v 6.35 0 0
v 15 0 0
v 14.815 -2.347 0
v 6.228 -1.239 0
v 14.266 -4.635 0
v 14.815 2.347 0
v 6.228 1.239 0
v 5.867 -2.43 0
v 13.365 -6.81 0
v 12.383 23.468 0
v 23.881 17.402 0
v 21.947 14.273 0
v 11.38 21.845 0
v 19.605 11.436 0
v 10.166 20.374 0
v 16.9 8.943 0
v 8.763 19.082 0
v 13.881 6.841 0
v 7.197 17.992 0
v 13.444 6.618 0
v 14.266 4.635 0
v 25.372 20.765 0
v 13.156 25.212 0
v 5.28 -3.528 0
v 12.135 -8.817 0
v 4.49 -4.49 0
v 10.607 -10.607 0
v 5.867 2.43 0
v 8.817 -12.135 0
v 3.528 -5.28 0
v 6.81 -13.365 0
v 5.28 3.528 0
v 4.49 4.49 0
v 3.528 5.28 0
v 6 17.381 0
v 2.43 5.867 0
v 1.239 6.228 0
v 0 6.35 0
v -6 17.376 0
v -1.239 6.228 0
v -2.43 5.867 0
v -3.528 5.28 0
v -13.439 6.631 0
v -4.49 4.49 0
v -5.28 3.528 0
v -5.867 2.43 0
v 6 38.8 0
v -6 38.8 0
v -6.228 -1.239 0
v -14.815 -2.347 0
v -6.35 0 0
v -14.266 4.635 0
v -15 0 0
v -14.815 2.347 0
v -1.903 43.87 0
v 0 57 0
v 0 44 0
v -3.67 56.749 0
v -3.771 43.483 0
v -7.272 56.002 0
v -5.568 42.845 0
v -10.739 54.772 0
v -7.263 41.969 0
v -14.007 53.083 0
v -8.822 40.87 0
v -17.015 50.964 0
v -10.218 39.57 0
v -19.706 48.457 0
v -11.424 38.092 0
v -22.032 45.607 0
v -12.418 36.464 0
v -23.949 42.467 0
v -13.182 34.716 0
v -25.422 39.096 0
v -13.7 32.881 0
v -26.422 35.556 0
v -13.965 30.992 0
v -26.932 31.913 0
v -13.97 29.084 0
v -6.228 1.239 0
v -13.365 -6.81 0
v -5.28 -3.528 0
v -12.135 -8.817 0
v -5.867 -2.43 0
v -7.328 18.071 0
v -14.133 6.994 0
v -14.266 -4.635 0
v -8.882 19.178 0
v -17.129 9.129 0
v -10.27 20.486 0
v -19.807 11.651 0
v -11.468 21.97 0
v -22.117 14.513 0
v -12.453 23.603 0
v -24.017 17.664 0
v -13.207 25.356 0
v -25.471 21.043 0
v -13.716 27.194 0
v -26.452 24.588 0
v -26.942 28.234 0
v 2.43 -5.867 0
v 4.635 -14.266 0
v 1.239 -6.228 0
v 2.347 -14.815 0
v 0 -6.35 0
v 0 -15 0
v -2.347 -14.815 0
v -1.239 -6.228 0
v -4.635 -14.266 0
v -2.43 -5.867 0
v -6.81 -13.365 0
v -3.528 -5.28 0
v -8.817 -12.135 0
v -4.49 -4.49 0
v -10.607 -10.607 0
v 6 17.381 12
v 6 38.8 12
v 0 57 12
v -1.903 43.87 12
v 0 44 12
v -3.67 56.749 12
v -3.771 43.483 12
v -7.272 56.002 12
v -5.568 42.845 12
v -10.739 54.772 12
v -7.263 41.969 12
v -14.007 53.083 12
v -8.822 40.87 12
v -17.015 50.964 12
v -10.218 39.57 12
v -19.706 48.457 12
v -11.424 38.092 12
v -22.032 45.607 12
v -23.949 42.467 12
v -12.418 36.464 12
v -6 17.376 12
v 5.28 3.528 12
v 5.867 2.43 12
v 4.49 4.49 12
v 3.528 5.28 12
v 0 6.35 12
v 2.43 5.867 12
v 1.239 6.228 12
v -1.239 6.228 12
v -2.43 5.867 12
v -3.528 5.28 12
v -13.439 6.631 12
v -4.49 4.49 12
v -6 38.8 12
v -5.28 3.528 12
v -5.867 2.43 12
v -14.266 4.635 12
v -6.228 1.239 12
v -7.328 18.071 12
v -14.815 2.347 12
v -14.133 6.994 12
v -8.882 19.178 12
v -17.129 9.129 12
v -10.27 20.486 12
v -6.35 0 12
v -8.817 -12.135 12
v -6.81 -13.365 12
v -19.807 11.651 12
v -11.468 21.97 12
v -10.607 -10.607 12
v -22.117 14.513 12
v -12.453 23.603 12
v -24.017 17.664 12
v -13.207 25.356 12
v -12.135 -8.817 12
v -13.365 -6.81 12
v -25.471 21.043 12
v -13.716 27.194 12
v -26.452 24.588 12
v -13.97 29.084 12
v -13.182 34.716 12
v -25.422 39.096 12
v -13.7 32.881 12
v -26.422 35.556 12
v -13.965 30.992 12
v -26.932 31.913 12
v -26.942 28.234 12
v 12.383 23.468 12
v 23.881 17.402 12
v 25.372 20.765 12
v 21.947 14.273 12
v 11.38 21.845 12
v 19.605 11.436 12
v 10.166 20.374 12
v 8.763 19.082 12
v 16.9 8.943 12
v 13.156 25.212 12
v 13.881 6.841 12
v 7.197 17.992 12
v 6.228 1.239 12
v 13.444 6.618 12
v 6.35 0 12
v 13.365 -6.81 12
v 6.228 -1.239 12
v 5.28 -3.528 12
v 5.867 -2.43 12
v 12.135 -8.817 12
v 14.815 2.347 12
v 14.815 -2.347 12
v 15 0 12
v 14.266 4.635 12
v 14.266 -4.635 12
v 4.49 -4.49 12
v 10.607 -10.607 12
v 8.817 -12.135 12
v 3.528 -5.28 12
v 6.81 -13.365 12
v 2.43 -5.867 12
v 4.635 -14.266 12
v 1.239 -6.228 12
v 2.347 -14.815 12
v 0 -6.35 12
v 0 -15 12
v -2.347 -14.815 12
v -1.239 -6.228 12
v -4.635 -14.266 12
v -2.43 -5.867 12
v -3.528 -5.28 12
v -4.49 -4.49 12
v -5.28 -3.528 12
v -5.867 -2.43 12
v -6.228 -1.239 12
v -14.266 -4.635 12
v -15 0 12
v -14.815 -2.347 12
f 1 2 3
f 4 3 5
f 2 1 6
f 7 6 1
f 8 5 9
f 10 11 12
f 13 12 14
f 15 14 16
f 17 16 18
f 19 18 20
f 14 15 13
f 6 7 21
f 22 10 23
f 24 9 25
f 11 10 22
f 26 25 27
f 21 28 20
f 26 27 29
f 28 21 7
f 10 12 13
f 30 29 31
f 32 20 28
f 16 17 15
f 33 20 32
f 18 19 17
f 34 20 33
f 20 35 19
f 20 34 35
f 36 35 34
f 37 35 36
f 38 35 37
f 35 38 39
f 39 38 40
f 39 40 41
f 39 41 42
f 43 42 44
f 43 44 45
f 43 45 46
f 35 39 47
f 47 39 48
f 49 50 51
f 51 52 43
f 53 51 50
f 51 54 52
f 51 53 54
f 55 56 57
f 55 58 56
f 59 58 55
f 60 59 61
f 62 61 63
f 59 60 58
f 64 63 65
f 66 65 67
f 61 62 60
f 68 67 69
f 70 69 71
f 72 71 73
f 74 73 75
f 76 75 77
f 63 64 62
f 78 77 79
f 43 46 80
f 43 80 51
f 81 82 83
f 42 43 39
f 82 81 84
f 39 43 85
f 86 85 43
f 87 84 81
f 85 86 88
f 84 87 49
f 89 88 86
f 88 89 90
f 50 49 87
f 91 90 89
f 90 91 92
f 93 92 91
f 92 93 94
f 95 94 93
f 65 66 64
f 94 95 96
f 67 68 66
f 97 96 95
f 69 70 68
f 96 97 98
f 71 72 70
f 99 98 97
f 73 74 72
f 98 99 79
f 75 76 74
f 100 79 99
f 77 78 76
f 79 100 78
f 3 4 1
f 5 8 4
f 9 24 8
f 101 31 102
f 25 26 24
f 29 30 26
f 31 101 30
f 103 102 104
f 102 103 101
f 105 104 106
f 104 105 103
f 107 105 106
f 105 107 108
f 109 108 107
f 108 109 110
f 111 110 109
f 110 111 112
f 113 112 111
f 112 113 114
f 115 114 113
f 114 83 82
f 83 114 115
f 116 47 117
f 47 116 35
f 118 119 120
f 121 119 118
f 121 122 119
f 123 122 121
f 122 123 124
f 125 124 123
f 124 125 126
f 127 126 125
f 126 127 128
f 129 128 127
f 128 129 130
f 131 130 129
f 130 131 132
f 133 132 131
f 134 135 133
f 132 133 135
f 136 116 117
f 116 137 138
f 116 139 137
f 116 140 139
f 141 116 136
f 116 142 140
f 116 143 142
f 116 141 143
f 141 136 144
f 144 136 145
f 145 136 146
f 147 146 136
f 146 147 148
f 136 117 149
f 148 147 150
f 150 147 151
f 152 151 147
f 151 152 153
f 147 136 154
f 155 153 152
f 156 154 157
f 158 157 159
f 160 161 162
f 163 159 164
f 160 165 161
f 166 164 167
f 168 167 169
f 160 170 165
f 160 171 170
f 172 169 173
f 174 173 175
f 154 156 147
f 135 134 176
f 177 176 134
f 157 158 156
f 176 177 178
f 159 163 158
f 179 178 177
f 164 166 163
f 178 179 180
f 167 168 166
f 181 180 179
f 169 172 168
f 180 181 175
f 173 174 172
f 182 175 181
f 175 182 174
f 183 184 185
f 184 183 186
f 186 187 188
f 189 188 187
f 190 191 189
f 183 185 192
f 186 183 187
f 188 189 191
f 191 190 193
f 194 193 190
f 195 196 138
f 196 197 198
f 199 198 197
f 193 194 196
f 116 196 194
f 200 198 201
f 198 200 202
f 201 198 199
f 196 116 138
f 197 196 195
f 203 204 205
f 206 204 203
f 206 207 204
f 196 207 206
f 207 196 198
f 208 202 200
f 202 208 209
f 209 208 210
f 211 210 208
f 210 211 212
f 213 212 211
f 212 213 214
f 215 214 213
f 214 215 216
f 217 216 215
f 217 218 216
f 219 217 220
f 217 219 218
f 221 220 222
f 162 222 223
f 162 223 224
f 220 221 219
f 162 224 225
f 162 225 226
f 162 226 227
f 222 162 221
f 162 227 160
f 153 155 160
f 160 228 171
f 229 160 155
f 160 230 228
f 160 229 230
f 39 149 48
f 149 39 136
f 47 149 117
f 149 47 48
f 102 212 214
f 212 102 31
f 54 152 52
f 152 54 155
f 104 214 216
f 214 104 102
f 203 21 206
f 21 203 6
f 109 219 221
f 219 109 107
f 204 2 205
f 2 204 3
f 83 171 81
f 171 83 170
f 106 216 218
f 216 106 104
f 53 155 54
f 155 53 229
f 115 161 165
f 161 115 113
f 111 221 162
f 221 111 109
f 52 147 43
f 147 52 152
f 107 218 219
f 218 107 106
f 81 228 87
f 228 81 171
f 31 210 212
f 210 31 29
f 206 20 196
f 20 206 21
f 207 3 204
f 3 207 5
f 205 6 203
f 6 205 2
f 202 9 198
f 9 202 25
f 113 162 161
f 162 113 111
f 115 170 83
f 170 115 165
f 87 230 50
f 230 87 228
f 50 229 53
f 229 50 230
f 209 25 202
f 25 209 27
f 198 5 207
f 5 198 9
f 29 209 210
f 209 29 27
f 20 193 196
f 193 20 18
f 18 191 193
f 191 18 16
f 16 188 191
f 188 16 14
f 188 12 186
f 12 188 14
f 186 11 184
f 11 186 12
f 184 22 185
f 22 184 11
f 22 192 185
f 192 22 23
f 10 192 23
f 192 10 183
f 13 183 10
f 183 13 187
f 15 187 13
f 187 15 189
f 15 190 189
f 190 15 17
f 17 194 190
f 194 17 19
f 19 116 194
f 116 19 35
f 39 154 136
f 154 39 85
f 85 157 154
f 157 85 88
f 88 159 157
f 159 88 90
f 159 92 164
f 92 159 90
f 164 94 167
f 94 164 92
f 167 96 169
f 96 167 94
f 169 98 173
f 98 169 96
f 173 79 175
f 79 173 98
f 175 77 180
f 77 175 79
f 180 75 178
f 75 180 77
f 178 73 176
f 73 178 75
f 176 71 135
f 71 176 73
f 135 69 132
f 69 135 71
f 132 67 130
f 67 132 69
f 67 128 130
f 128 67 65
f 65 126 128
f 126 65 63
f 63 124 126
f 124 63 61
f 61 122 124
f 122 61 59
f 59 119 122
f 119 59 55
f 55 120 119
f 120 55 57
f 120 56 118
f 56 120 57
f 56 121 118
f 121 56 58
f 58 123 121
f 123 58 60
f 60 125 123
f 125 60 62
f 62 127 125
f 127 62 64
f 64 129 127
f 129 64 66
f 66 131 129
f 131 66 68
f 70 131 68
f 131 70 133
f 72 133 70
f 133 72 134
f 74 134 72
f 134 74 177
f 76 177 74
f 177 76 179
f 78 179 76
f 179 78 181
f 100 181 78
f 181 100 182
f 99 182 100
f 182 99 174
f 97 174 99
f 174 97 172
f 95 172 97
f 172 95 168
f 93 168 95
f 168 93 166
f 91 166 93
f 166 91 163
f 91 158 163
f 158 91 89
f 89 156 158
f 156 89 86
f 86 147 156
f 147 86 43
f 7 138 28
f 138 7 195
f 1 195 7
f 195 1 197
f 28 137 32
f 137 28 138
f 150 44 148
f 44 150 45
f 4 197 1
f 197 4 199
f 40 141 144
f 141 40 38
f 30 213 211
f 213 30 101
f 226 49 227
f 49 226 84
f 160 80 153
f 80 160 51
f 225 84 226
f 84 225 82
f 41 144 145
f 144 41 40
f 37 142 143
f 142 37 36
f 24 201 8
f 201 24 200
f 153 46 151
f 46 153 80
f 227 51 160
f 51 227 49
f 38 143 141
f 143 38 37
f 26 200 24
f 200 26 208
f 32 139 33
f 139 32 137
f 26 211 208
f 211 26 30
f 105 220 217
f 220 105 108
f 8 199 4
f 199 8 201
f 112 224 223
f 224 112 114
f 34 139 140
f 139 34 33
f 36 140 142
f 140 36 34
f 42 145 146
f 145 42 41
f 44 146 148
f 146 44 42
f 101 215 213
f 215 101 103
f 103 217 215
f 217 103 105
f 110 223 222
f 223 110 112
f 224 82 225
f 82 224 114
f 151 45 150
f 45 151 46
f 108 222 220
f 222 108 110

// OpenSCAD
$fn = 32;

// ----------------------------------------------------------------------
// Hook: 60 mm shank into a 14 mm curl, 12 mm thick
// ----------------------------------------------------------------------

// --- parameters (mm) ---
shank_len = 60;           // shank length from the boss centre
shank_w = 12;             // shank width
boss_d = 30;              // boss diameter
bore_d = 12.7;            // boss bore
curl_in = 14;             // curl inner radius
curl_out = 27;            // curl outer radius
curl_sweep = 250;         // curl sweep angle
hook_t = 12;              // hook thickness

shank_profile = [[-6, 38.8], [6, 38.8], [6, 13], [-6, 13]];
boss_profile = [[15, 0], [14.815, 2.347], [14.266, 4.635], [13.365, 6.81], [12.135, 8.817], [10.607, 10.607], [8.817, 12.135], [6.81, 13.365], [4.635, 14.266], [2.347, 14.815], [0, 15], [-2.347, 14.815], [-4.635, 14.266], [-6.81, 13.365], [-8.817, 12.135], [-10.607, 10.607], [-12.135, 8.817], [-13.365, 6.81], [-14.266, 4.635], [-14.815, 2.347], [-15, 0], [-14.815, -2.347], [-14.266, -4.635], [-13.365, -6.81], [-12.135, -8.817], [-10.607, -10.607], [-8.817, -12.135], [-6.81, -13.365], [-4.635, -14.266], [-2.347, -14.815], [0, -15], [2.347, -14.815], [4.635, -14.266], [6.81, -13.365], [8.817, -12.135], [10.607, -10.607], [12.135, -8.817], [13.365, -6.81], [14.266, -4.635], [14.815, -2.347]];
curl_profile = [[0, 57], [-3.67, 56.749], [-7.272, 56.002], [-10.739, 54.772], [-14.007, 53.083], [-17.015, 50.964], [-19.706, 48.457], [-22.032, 45.607], [-23.949, 42.467], [-25.422, 39.096], [-26.422, 35.556], [-26.932, 31.913], [-26.942, 28.234], [-26.452, 24.588], [-25.471, 21.043], [-24.017, 17.664], [-22.117, 14.513], [-19.807, 11.651], [-17.129, 9.129], [-14.133, 6.994], [-10.874, 5.287], [-7.414, 4.038], [-3.816, 3.271], [-0.147, 3], [3.524, 3.231], [7.13, 3.959], [10.604, 5.169], [13.881, 6.841], [16.9, 8.943], [19.605, 11.436], [21.947, 14.273], [23.881, 17.402], [25.372, 20.765], [13.156, 25.212], [12.383, 23.468], [11.38, 21.845], [10.166, 20.374], [8.763, 19.082], [7.197, 17.992], [5.498, 17.125], [3.697, 16.497], [1.827, 16.12], [-0.076, 16], [-1.979, 16.141], [-3.844, 16.538], [-5.638, 17.186], [-7.328, 18.071], [-8.882, 19.178], [-10.27, 20.486], [-11.468, 21.97], [-12.453, 23.603], [-13.207, 25.356], [-13.716, 27.194], [-13.97, 29.084], [-13.965, 30.992], [-13.7, 32.881], [-13.182, 34.716], [-12.418, 36.464], [-11.424, 38.092], [-10.218, 39.57], [-8.822, 40.87], [-7.263, 41.969], [-5.568, 42.845], [-3.771, 43.483], [-1.903, 43.87], [0, 44]];

difference() {
  union() {
    /* three overlapping outlines: shank, boss and the smooth curl */
    linear_extrude(height = hook_t) polygon(shank_profile);
    linear_extrude(height = hook_t) polygon(boss_profile);
    linear_extrude(height = hook_t) polygon(curl_profile);
  }
  translate([0, 0, -2.5]) cylinder(h = hook_t + 5, d = bore_d);
}
